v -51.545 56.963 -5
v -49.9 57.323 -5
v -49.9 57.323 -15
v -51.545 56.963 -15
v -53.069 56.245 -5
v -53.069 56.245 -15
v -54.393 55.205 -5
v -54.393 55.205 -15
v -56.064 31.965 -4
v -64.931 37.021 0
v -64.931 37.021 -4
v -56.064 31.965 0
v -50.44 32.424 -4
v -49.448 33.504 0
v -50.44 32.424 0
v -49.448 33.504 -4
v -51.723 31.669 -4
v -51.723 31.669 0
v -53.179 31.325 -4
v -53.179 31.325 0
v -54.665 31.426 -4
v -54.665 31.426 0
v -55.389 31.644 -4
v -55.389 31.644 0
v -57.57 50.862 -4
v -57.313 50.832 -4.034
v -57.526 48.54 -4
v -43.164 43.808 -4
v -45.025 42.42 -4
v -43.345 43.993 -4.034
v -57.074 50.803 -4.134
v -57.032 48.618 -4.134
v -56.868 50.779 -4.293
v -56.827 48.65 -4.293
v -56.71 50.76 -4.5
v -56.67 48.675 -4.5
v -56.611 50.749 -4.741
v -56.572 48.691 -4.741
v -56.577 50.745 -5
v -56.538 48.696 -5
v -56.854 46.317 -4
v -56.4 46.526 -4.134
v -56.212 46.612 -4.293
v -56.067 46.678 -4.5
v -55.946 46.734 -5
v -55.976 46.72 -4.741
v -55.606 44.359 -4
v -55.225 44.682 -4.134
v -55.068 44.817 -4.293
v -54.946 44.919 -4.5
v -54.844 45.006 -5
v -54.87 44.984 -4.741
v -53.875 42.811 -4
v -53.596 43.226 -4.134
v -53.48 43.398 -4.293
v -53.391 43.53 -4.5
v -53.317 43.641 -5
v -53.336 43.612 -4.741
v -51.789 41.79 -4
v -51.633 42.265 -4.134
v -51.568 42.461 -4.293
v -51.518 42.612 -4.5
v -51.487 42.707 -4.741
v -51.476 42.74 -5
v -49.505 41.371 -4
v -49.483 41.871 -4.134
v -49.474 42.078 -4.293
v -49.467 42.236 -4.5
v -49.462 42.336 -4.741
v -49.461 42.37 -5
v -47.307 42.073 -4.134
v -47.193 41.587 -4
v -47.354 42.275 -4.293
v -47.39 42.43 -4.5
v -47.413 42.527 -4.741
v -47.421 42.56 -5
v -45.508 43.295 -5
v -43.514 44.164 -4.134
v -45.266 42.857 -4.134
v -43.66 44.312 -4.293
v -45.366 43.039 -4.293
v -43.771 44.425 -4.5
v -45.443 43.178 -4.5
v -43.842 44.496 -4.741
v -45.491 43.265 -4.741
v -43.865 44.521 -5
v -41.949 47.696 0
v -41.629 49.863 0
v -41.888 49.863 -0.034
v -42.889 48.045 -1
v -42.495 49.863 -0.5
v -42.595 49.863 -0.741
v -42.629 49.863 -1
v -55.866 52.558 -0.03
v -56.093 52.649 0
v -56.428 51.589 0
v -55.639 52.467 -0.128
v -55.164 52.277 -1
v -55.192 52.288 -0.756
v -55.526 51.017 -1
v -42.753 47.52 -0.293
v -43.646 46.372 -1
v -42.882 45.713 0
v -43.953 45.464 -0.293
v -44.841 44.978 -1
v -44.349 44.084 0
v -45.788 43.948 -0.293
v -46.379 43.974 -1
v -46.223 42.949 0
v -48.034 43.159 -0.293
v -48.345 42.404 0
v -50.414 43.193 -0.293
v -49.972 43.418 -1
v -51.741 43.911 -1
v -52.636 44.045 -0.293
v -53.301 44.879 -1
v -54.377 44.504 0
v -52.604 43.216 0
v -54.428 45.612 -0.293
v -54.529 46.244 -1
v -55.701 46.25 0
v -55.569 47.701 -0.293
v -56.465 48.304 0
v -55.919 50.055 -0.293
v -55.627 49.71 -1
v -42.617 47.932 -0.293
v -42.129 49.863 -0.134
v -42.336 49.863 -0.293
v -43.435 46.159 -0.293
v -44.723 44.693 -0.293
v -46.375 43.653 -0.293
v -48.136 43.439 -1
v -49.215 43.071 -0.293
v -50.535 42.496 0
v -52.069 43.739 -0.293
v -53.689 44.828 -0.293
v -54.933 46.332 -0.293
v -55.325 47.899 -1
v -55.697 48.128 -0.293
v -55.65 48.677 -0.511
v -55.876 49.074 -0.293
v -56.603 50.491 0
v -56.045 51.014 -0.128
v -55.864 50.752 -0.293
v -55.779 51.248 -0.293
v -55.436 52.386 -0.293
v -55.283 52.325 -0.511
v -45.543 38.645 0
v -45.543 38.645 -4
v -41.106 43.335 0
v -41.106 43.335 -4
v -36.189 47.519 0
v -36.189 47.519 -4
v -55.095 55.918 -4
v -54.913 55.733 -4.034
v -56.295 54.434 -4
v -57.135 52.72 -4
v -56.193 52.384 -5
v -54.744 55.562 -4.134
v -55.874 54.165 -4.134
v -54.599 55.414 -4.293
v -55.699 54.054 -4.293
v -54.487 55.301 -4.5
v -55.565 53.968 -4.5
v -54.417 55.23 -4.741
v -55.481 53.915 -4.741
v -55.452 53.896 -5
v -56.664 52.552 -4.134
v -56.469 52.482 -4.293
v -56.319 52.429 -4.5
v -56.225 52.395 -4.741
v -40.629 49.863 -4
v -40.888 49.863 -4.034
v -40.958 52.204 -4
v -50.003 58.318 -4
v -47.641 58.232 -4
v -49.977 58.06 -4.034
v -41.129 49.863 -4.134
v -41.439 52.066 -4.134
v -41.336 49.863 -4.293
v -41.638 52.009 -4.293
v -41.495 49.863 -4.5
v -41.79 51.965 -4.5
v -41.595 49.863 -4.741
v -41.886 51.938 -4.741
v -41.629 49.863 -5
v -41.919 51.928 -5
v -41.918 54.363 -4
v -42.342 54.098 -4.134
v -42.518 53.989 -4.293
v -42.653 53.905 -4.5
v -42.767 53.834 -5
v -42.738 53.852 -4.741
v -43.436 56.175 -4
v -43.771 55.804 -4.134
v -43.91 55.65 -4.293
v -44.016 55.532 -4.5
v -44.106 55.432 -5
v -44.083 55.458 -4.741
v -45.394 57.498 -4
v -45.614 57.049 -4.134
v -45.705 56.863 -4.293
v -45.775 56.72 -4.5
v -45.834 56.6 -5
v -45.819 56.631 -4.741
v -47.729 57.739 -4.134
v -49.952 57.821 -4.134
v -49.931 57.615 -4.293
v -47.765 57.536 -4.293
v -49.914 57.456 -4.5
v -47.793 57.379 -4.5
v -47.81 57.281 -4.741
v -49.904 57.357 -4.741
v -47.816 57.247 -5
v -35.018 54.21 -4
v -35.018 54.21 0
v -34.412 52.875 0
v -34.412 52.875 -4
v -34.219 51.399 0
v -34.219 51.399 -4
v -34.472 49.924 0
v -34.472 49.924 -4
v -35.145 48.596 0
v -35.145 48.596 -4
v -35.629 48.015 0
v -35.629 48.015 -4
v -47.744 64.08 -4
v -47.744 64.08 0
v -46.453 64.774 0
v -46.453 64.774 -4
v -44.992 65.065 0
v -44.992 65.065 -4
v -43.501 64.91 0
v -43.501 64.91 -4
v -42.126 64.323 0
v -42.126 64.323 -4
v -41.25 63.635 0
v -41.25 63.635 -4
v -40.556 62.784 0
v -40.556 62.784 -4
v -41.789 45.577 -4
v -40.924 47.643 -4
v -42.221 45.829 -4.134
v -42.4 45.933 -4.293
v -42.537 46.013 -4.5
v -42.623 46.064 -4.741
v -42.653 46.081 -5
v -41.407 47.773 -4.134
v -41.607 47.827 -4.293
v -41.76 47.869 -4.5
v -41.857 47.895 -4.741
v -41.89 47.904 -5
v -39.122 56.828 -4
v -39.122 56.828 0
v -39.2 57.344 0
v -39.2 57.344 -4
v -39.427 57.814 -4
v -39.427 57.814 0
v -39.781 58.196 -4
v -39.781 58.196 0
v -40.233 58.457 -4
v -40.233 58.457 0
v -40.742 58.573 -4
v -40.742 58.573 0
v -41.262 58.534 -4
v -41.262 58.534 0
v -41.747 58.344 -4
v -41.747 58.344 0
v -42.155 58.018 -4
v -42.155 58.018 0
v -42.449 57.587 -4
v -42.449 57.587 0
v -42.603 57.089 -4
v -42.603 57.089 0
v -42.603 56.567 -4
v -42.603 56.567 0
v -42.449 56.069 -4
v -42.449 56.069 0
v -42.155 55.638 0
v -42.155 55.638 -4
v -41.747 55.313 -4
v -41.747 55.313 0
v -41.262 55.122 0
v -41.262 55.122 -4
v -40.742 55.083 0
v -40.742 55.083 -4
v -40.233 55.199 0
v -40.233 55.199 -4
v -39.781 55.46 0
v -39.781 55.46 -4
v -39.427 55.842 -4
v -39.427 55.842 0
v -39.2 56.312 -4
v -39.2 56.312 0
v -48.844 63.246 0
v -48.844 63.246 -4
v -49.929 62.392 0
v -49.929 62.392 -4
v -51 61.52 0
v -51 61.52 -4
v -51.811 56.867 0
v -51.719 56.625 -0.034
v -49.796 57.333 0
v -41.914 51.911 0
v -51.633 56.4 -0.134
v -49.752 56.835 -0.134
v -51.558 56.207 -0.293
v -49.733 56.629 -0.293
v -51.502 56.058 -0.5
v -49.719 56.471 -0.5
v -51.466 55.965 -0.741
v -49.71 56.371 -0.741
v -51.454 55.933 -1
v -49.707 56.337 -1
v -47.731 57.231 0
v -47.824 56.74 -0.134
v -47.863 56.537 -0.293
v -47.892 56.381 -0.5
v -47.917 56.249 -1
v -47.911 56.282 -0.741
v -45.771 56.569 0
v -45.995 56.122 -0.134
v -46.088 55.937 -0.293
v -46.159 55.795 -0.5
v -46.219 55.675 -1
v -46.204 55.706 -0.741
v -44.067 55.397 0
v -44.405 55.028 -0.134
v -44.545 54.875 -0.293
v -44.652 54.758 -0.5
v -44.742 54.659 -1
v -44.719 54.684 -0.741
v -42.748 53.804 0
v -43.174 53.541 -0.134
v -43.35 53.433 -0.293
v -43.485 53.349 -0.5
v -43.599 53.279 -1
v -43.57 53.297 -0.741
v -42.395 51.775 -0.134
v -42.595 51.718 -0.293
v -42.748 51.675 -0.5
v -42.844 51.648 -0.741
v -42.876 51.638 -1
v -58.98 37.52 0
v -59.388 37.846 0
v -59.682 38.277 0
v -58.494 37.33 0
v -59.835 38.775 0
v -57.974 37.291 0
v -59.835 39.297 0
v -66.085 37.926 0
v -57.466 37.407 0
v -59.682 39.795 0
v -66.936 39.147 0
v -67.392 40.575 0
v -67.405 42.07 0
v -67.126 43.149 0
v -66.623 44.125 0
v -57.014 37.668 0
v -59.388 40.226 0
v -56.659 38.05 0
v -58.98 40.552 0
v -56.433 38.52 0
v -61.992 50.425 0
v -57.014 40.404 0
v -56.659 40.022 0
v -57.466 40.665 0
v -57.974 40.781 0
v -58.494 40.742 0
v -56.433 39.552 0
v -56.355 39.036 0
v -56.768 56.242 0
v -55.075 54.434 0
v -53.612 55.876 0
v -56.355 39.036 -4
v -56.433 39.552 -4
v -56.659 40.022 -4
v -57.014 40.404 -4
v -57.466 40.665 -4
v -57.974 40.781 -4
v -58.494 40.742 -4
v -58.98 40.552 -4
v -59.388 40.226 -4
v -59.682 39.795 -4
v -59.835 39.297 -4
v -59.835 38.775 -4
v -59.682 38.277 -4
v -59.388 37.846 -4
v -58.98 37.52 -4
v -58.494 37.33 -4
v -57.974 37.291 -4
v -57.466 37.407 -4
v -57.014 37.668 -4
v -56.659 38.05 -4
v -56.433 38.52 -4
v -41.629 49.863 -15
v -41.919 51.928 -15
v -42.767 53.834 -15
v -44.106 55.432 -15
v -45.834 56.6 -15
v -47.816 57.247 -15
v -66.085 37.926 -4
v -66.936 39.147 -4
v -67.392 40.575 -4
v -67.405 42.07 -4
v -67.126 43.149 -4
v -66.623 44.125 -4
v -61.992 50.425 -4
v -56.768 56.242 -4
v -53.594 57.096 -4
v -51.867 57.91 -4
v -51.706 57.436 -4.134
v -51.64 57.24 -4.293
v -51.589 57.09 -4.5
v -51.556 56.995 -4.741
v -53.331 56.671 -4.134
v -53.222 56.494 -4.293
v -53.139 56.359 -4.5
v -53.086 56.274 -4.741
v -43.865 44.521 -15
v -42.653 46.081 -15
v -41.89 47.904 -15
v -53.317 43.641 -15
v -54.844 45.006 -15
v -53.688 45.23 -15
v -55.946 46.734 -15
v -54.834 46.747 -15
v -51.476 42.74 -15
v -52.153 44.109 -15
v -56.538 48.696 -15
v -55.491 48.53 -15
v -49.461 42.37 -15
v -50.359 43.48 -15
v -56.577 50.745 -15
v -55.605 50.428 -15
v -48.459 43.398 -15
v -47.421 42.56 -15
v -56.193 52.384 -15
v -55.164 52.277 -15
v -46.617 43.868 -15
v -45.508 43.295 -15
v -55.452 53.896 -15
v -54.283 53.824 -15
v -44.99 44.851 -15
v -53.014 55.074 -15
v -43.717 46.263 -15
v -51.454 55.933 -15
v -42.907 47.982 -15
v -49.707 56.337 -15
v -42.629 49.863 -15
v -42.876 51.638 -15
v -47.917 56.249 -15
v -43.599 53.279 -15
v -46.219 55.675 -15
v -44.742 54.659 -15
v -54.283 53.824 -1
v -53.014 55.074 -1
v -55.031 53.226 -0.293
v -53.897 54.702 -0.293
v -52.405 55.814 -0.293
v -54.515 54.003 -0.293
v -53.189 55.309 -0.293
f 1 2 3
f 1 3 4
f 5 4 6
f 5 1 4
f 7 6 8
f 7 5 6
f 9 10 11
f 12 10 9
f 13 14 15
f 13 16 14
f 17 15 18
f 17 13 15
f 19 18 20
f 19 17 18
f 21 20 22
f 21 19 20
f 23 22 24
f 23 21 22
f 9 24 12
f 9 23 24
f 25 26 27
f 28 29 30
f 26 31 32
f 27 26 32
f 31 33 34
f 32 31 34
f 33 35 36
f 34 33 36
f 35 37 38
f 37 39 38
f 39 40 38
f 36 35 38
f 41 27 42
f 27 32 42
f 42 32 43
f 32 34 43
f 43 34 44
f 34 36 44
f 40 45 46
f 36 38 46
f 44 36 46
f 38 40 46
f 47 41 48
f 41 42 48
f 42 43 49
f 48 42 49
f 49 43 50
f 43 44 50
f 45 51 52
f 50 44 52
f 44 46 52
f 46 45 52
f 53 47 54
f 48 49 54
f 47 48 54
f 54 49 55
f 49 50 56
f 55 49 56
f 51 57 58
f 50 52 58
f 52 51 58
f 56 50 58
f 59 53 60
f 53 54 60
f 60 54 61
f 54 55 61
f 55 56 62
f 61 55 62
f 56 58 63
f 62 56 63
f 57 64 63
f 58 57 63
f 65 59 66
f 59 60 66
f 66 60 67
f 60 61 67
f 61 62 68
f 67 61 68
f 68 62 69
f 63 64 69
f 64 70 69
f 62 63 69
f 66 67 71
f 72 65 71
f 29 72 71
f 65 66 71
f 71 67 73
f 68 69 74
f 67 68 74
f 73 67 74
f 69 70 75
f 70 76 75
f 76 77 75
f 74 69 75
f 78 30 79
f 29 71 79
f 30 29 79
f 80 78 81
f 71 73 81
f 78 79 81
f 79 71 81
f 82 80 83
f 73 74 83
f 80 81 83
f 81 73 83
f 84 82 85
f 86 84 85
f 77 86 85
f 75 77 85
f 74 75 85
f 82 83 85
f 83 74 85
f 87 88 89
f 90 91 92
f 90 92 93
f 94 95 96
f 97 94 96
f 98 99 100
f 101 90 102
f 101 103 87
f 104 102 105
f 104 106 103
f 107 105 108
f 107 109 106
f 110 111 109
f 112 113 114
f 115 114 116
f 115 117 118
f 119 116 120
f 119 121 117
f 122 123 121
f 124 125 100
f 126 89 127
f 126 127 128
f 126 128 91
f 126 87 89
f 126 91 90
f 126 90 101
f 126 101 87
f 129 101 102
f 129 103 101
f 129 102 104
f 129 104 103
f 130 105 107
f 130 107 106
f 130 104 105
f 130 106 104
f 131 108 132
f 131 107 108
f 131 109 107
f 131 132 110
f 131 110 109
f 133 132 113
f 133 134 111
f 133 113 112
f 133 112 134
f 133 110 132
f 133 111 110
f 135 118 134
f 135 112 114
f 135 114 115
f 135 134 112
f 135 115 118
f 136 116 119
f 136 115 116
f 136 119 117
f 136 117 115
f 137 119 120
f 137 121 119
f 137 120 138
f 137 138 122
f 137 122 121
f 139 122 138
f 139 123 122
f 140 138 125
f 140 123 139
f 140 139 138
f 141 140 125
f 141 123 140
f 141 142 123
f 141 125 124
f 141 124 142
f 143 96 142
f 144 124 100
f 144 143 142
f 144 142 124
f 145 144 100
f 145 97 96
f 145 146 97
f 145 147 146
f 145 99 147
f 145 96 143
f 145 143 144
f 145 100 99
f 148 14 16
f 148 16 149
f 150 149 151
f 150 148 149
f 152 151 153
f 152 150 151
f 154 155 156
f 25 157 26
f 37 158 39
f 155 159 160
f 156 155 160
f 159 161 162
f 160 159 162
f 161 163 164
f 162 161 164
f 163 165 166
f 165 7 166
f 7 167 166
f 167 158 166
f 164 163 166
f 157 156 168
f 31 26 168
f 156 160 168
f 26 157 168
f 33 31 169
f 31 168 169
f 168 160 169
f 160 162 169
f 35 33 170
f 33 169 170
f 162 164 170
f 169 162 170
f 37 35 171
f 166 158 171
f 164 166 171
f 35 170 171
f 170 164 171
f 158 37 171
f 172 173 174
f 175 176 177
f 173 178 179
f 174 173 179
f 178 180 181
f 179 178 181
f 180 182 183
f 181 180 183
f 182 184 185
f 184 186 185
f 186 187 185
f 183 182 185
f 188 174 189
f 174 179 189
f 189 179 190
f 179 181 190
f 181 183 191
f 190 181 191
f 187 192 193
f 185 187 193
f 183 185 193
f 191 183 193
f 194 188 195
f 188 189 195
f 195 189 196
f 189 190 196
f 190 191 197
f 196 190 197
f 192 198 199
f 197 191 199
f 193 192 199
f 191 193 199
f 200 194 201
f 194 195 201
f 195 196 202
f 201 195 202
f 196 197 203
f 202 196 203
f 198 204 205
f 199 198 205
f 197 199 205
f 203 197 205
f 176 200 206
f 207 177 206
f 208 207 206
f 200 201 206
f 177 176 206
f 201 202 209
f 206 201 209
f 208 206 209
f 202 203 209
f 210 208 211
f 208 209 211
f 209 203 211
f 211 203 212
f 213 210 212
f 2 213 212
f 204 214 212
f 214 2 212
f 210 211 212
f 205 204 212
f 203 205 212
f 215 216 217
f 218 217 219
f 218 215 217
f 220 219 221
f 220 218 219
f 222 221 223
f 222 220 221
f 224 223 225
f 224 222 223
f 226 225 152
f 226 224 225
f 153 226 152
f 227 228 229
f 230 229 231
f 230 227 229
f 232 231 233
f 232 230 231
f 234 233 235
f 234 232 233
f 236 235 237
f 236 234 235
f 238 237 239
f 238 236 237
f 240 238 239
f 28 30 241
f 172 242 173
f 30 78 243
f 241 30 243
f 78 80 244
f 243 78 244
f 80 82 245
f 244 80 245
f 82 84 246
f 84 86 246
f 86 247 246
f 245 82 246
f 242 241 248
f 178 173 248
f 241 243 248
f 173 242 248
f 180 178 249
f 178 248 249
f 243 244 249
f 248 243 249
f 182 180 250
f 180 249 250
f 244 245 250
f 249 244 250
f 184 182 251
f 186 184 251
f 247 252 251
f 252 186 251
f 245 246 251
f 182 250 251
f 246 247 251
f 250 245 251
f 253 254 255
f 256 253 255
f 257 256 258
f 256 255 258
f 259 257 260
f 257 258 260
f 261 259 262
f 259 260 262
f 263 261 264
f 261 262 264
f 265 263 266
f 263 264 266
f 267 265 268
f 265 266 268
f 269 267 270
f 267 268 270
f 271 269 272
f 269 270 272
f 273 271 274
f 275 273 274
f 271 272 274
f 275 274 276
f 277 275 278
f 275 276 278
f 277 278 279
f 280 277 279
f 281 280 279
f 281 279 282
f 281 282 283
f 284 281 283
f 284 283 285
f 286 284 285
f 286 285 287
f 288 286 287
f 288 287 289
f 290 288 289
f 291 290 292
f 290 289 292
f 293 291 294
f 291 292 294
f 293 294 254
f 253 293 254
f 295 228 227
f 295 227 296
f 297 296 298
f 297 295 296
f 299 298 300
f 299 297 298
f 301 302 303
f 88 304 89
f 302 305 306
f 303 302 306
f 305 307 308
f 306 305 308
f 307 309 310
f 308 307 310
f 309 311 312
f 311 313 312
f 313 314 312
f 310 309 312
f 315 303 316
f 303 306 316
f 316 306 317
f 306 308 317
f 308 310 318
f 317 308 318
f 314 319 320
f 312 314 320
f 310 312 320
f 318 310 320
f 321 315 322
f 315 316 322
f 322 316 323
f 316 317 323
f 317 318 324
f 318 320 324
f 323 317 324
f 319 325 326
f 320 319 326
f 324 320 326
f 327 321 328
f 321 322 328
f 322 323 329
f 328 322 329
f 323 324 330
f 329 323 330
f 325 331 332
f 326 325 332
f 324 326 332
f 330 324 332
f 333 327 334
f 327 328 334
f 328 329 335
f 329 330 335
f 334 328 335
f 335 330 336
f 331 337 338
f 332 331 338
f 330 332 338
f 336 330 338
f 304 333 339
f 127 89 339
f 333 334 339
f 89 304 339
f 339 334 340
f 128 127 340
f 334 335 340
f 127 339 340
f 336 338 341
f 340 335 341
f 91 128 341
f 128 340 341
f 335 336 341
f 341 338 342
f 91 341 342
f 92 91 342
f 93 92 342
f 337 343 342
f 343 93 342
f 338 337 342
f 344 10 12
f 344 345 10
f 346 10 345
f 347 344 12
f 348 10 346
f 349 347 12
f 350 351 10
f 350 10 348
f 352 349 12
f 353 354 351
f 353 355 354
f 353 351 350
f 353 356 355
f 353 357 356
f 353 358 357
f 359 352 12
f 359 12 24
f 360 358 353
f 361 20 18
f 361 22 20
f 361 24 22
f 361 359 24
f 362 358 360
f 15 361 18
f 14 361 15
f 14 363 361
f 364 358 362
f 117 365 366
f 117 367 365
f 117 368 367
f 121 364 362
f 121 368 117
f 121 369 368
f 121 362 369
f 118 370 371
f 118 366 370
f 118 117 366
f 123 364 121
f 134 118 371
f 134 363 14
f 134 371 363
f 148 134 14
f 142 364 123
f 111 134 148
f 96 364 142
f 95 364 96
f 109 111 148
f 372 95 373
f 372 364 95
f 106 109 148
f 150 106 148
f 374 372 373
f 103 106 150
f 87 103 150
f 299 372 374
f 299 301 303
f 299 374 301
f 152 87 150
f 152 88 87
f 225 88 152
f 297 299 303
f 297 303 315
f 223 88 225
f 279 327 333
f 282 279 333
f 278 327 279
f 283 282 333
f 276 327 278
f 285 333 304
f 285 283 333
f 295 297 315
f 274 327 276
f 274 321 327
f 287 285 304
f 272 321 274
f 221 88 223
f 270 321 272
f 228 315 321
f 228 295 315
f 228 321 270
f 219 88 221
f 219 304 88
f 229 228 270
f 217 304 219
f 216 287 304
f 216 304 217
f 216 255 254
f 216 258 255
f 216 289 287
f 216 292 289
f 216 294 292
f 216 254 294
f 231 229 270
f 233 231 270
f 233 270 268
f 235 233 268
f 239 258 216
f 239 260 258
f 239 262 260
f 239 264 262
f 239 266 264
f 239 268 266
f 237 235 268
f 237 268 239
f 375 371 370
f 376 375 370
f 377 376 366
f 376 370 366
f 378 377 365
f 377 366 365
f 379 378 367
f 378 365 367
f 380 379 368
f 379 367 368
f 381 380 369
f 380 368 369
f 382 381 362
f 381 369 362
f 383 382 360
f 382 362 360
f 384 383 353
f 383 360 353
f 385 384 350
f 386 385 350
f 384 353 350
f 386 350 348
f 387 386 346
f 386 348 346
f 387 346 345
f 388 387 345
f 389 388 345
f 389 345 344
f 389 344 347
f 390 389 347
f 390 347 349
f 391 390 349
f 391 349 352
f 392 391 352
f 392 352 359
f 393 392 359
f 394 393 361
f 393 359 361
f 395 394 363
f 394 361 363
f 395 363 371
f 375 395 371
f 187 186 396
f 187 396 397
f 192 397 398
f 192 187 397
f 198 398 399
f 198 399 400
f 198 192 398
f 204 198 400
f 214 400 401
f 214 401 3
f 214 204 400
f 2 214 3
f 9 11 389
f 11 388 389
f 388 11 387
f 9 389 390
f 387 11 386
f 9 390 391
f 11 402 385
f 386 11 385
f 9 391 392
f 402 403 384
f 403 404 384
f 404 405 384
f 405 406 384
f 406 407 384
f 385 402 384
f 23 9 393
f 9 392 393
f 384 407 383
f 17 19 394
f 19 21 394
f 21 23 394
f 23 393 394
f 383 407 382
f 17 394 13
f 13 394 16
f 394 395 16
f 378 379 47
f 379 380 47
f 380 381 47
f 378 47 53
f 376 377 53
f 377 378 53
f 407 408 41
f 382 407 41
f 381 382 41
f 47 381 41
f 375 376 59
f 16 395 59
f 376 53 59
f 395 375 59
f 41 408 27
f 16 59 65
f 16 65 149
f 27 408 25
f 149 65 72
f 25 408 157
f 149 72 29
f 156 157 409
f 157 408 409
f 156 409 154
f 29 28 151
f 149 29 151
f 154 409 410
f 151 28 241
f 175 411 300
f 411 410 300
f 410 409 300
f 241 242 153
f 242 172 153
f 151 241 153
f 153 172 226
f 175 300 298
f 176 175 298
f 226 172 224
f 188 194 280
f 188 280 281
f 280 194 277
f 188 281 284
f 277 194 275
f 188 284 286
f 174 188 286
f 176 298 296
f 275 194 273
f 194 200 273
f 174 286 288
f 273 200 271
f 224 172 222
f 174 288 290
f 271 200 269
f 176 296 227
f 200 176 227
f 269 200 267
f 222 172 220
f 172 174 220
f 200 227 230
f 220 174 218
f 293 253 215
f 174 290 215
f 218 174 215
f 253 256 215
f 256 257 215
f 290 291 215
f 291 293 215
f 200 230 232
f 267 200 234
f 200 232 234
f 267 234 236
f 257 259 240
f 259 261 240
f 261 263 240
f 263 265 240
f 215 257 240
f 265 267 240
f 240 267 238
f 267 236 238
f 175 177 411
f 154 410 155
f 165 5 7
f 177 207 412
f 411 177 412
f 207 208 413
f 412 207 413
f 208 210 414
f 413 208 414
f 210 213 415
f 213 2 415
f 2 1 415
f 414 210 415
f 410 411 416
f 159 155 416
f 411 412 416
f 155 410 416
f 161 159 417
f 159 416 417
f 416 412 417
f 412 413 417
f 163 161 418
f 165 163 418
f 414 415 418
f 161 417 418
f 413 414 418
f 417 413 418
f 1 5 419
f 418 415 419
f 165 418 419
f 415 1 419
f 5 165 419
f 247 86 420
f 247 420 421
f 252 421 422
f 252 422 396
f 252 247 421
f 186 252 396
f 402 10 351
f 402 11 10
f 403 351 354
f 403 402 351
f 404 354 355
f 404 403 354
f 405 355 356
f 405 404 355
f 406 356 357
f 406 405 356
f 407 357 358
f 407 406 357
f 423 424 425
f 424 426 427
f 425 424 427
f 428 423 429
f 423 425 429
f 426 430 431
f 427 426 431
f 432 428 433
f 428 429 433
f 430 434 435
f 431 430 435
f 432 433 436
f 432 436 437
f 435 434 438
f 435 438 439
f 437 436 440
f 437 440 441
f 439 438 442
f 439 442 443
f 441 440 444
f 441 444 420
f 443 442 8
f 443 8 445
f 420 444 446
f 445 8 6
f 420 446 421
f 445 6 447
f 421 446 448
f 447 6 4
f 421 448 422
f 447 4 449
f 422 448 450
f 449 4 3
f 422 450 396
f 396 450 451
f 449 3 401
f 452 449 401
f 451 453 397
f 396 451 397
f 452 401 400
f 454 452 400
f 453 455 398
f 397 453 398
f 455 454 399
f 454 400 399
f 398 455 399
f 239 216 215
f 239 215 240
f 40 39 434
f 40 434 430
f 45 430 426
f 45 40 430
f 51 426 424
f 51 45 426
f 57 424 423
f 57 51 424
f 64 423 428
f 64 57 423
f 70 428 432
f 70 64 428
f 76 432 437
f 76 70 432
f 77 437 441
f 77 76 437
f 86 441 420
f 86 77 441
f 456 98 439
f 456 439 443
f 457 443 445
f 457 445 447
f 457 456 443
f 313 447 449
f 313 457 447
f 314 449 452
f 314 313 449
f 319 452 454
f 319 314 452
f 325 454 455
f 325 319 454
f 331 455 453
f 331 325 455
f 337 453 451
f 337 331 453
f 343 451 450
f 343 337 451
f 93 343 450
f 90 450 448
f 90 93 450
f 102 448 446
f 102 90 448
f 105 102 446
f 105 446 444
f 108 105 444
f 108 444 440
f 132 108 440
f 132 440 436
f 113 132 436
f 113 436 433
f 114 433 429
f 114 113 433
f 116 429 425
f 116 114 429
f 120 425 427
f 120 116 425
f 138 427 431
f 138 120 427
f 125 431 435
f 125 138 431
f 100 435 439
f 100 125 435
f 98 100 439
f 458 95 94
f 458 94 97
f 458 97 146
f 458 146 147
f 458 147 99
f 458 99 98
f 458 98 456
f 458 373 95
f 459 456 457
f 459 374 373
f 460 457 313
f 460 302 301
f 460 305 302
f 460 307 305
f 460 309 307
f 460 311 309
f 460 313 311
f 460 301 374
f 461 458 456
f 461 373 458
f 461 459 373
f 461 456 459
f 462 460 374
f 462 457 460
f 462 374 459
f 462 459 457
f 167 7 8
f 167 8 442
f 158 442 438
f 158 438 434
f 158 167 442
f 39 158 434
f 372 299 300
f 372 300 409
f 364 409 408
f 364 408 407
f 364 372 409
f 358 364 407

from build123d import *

# Parameters (mm, degrees)
F0_R     = 1.75
F1_DEPTH = 4
F2_DEPTH = 15
F3_R     = 5
F4_R     = 1


# Not quite as in the source:
# - a feature names something its author has since deleted; it is built from what else it names


with BuildPart() as f1:
    # F0 (on Top) → F1 (new body)
    with BuildSketch(Plane.XY):
        with BuildLine():
            Line((-33.9130103109, 52.4991212465), (-41.2382205381, 63.8389314357))
            ThreePointArc((-41.2382205381, 63.8389314357), (-44.9500240756, 61.2820963709), (-48.5037329382, 58.5097247563))
            ThreePointArc((-48.5037329382, 58.5097247563), (-49.20563764, 57.9206804556), (-49.9003894351, 57.3232163633))
            ThreePointArc((-49.9003894351, 57.3232163633), (-44.1059919264, 55.4322284704), (-41.6292667465, 49.8629637))
            ThreePointArc((-41.6292667465, 49.8629637), (-42.2108537269, 46.9671803363), (-43.8654164238, 44.5205036131))
            ThreePointArc((-43.8654164238, 44.5205036131), (-39.0932922784, 48.7643773551), (-33.9130103109, 52.4991212465))
        make_face()
        with Locations((-40.8724684836, 56.828173647)):
            Circle(F0_R, mode=Mode.SUBTRACT)
        with BuildLine():
            ThreePointArc((-49.4610434567, 59.6645219554), (-51.9749220296, 57.4878898553), (-54.3931164452, 55.2054244018))
            ThreePointArc((-54.3931164452, 55.2054244018), (-52.3271541158, 56.6470271117), (-49.9003894351, 57.3232163633))
            ThreePointArc((-49.9003894351, 57.3232163633), (-49.20563764, 57.9206804556), (-48.5037329382, 58.5097247563))
            Line((-48.5037329382, 58.5097247563), (-49.4610434568, 59.6645219554))
        make_face()
        with BuildLine():
            Line((-69.4199358602, 39.5800459158), (-67.3257807989, 38.3860552782))
            ThreePointArc((-67.3257807989, 38.3860552782), (-61.4377349925, 47.2403928751), (-54.3931164452, 55.2054244018))
            ThreePointArc((-54.3931164452, 55.2054244018), (-51.9749220296, 57.4878898553), (-49.4610434567, 59.6645219554))
            Line((-49.4610434568, 59.6645219554), (-50.9995194055, 61.5203750796))
            ThreePointArc((-50.9995194055, 61.5203750796), (-61.2009461738, 51.382406687), (-69.4199358602, 39.5800459158))
        make_face()
        with BuildLine():
            ThreePointArc((-49.4610434567, 59.6645219554), (-45.8371956034, 62.4916114308), (-42.0521327855, 65.0989103456))
            Line((-42.0521327855, 65.0989103456), (-43.360156037, 67.123799043))
            ThreePointArc((-43.360156037, 67.123799043), (-47.2629524833, 64.4354006125), (-50.9995194055, 61.5203750796))
            Line((-50.9995194055, 61.5203750796), (-49.4610434568, 59.6645219554))
        make_face()
        with BuildLine():
            Line((-41.2382205381, 63.8389314357), (-42.0521327855, 65.0989103456))
            ThreePointArc((-42.0521327855, 65.0989103456), (-45.8371956034, 62.4916114308), (-49.4610434567, 59.6645219554))
            Line((-49.4610434568, 59.6645219554), (-48.5037329382, 58.5097247563))
            ThreePointArc((-48.5037329382, 58.5097247563), (-44.9500240756, 61.2820963709), (-41.2382205381, 63.8389314357))
        make_face()
        with BuildLine():
            ThreePointArc((-54.3931164452, 55.2054244018), (-61.4377349925, 47.2403928751), (-67.3257807989, 38.3860552782))
            Line((-67.3257807989, 38.3860552782), (-66.0227011705, 37.6430993696))
            ThreePointArc((-66.0227011705, 37.6430993696), (-61.6490099795, 44.4454673566), (-56.577269857, 50.7445813415))
            ThreePointArc((-56.577269857, 50.7445813415), (-55.8651839567, 53.1610569882), (-54.3931164452, 55.2054244018))
        make_face()
        with BuildLine():
            ThreePointArc((-49.9003894351, 57.3232163633), (-52.3271541158, 56.6470271117), (-54.3931164452, 55.2054244018))
            ThreePointArc((-54.3931164452, 55.2054244018), (-55.8651839567, 53.1610569882), (-56.577269857, 50.7445813415))
            ThreePointArc((-56.577269857, 50.7445813415), (-55.8760464089, 51.5157008854), (-55.1643138946, 52.277131449))
            ThreePointArc((-55.1643138946, 52.277131449), (-53.6912700872, 54.4930960436), (-51.453714731, 55.9331318663))
            ThreePointArc((-51.453714731, 55.9331318663), (-50.6818181556, 56.6334998781), (-49.9003894351, 57.3232163633))
        make_face()
        with BuildLine():
            ThreePointArc((-41.6292667465, 49.8629637), (-44.1059919264, 55.4322284704), (-49.9003894351, 57.3232163633))
            ThreePointArc((-49.9003894351, 57.3232163633), (-50.6818181556, 56.6334998781), (-51.453714731, 55.9331318663))
            ThreePointArc((-51.453714731, 55.9331318663), (-45.4454448113, 55.2182840406), (-42.6292667465, 49.8629637))
            ThreePointArc((-42.6292667465, 49.8629637), (-50.3585335071, 43.4802602578), (-55.1643138946, 52.277131449))
            ThreePointArc((-55.1643138946, 52.277131449), (-55.8760464089, 51.5157008854), (-56.577269857, 50.7445813415))
            ThreePointArc((-56.577269857, 50.7445813415), (-52.4273596413, 43.1270462972), (-43.8654164238, 44.5205036131))
            ThreePointArc((-43.8654164238, 44.5205036131), (-42.2108537269, 46.9671803363), (-41.6292667465, 49.8629637))
        make_face()
        with BuildLine():
            ThreePointArc((-56.577269857, 50.7445813415), (-61.6490099795, 44.4454673566), (-66.0227011705, 37.6430993696))
            Line((-66.0227011705, 37.6430993696), (-54.2949845152, 30.9564961921))
            ThreePointArc((-54.2949845152, 30.9564961921), (-49.5465604503, 38.0970910641), (-43.8654164238, 44.5205036131))
            ThreePointArc((-43.8654164238, 44.5205036131), (-52.4273596413, 43.1270462972), (-56.577269857, 50.7445813415))
        make_face()
        with Locations((-58.1049998349, 39.0359961341)):
            Circle(F0_R, mode=Mode.SUBTRACT)
        with BuildLine():
            ThreePointArc((-43.8654164238, 44.5205036131), (-49.5465604503, 38.0970910641), (-54.2949845152, 30.9564961921))
            Line((-54.2949845152, 30.9564961921), (-51.8884792508, 29.5844178737))
            ThreePointArc((-51.8884792508, 29.5844178737), (-43.387995367, 41.0503826769), (-32.4098910344, 50.1722136548))
            Line((-32.4098910344, 50.1722136548), (-33.9130103109, 52.4991212465))
            ThreePointArc((-33.9130103109, 52.4991212465), (-39.0932922784, 48.7643773551), (-43.8654164238, 44.5205036131))
        make_face()
    extrude(amount=-F1_DEPTH)

    # F0 (on Top) → F2 (join)
    with BuildSketch(Plane.XY):
        with BuildLine():
            ThreePointArc((-49.9003894351, 57.3232163633), (-52.3271541158, 56.6470271117), (-54.3931164452, 55.2054244018))
            ThreePointArc((-54.3931164452, 55.2054244018), (-55.8651839567, 53.1610569882), (-56.577269857, 50.7445813415))
            ThreePointArc((-56.577269857, 50.7445813415), (-55.8760464089, 51.5157008854), (-55.1643138946, 52.277131449))
            ThreePointArc((-55.1643138946, 52.277131449), (-53.6912700872, 54.4930960436), (-51.453714731, 55.9331318663))
            ThreePointArc((-51.453714731, 55.9331318663), (-50.6818181556, 56.6334998781), (-49.9003894351, 57.3232163633))
        make_face()
        with BuildLine():
            ThreePointArc((-41.6292667465, 49.8629637), (-44.1059919264, 55.4322284704), (-49.9003894351, 57.3232163633))
            ThreePointArc((-49.9003894351, 57.3232163633), (-50.6818181556, 56.6334998781), (-51.453714731, 55.9331318663))
            ThreePointArc((-51.453714731, 55.9331318663), (-45.4454448113, 55.2182840406), (-42.6292667465, 49.8629637))
            ThreePointArc((-42.6292667465, 49.8629637), (-50.3585335071, 43.4802602578), (-55.1643138946, 52.277131449))
            ThreePointArc((-55.1643138946, 52.277131449), (-55.8760464089, 51.5157008854), (-56.577269857, 50.7445813415))
            ThreePointArc((-56.577269857, 50.7445813415), (-52.4273596413, 43.1270462972), (-43.8654164238, 44.5205036131))
            ThreePointArc((-43.8654164238, 44.5205036131), (-42.2108537269, 46.9671803363), (-41.6292667465, 49.8629637))
        make_face()
    extrude(amount=-F2_DEPTH)

    # F3
    f3_edges = [f1.edges().sort_by_distance(p)[0] for p in [
        (-43.360156, 67.123799, -2),
        (-32.409891, 50.172214, -2),
        (-69.419936, 39.580046, -2),
        (-51.888479, 29.584418, -2),
    ]]
    fillet(f3_edges, radius=F3_R)

    # F4
    f4_edges = [f1.edges().sort_by_distance(p)[0] for p in [
        (-43.865417, 44.520503, -4),
        (-46.804819, 43.792796, 0),
    ]]
    fillet(f4_edges, radius=F4_R)


solid = f1.part
